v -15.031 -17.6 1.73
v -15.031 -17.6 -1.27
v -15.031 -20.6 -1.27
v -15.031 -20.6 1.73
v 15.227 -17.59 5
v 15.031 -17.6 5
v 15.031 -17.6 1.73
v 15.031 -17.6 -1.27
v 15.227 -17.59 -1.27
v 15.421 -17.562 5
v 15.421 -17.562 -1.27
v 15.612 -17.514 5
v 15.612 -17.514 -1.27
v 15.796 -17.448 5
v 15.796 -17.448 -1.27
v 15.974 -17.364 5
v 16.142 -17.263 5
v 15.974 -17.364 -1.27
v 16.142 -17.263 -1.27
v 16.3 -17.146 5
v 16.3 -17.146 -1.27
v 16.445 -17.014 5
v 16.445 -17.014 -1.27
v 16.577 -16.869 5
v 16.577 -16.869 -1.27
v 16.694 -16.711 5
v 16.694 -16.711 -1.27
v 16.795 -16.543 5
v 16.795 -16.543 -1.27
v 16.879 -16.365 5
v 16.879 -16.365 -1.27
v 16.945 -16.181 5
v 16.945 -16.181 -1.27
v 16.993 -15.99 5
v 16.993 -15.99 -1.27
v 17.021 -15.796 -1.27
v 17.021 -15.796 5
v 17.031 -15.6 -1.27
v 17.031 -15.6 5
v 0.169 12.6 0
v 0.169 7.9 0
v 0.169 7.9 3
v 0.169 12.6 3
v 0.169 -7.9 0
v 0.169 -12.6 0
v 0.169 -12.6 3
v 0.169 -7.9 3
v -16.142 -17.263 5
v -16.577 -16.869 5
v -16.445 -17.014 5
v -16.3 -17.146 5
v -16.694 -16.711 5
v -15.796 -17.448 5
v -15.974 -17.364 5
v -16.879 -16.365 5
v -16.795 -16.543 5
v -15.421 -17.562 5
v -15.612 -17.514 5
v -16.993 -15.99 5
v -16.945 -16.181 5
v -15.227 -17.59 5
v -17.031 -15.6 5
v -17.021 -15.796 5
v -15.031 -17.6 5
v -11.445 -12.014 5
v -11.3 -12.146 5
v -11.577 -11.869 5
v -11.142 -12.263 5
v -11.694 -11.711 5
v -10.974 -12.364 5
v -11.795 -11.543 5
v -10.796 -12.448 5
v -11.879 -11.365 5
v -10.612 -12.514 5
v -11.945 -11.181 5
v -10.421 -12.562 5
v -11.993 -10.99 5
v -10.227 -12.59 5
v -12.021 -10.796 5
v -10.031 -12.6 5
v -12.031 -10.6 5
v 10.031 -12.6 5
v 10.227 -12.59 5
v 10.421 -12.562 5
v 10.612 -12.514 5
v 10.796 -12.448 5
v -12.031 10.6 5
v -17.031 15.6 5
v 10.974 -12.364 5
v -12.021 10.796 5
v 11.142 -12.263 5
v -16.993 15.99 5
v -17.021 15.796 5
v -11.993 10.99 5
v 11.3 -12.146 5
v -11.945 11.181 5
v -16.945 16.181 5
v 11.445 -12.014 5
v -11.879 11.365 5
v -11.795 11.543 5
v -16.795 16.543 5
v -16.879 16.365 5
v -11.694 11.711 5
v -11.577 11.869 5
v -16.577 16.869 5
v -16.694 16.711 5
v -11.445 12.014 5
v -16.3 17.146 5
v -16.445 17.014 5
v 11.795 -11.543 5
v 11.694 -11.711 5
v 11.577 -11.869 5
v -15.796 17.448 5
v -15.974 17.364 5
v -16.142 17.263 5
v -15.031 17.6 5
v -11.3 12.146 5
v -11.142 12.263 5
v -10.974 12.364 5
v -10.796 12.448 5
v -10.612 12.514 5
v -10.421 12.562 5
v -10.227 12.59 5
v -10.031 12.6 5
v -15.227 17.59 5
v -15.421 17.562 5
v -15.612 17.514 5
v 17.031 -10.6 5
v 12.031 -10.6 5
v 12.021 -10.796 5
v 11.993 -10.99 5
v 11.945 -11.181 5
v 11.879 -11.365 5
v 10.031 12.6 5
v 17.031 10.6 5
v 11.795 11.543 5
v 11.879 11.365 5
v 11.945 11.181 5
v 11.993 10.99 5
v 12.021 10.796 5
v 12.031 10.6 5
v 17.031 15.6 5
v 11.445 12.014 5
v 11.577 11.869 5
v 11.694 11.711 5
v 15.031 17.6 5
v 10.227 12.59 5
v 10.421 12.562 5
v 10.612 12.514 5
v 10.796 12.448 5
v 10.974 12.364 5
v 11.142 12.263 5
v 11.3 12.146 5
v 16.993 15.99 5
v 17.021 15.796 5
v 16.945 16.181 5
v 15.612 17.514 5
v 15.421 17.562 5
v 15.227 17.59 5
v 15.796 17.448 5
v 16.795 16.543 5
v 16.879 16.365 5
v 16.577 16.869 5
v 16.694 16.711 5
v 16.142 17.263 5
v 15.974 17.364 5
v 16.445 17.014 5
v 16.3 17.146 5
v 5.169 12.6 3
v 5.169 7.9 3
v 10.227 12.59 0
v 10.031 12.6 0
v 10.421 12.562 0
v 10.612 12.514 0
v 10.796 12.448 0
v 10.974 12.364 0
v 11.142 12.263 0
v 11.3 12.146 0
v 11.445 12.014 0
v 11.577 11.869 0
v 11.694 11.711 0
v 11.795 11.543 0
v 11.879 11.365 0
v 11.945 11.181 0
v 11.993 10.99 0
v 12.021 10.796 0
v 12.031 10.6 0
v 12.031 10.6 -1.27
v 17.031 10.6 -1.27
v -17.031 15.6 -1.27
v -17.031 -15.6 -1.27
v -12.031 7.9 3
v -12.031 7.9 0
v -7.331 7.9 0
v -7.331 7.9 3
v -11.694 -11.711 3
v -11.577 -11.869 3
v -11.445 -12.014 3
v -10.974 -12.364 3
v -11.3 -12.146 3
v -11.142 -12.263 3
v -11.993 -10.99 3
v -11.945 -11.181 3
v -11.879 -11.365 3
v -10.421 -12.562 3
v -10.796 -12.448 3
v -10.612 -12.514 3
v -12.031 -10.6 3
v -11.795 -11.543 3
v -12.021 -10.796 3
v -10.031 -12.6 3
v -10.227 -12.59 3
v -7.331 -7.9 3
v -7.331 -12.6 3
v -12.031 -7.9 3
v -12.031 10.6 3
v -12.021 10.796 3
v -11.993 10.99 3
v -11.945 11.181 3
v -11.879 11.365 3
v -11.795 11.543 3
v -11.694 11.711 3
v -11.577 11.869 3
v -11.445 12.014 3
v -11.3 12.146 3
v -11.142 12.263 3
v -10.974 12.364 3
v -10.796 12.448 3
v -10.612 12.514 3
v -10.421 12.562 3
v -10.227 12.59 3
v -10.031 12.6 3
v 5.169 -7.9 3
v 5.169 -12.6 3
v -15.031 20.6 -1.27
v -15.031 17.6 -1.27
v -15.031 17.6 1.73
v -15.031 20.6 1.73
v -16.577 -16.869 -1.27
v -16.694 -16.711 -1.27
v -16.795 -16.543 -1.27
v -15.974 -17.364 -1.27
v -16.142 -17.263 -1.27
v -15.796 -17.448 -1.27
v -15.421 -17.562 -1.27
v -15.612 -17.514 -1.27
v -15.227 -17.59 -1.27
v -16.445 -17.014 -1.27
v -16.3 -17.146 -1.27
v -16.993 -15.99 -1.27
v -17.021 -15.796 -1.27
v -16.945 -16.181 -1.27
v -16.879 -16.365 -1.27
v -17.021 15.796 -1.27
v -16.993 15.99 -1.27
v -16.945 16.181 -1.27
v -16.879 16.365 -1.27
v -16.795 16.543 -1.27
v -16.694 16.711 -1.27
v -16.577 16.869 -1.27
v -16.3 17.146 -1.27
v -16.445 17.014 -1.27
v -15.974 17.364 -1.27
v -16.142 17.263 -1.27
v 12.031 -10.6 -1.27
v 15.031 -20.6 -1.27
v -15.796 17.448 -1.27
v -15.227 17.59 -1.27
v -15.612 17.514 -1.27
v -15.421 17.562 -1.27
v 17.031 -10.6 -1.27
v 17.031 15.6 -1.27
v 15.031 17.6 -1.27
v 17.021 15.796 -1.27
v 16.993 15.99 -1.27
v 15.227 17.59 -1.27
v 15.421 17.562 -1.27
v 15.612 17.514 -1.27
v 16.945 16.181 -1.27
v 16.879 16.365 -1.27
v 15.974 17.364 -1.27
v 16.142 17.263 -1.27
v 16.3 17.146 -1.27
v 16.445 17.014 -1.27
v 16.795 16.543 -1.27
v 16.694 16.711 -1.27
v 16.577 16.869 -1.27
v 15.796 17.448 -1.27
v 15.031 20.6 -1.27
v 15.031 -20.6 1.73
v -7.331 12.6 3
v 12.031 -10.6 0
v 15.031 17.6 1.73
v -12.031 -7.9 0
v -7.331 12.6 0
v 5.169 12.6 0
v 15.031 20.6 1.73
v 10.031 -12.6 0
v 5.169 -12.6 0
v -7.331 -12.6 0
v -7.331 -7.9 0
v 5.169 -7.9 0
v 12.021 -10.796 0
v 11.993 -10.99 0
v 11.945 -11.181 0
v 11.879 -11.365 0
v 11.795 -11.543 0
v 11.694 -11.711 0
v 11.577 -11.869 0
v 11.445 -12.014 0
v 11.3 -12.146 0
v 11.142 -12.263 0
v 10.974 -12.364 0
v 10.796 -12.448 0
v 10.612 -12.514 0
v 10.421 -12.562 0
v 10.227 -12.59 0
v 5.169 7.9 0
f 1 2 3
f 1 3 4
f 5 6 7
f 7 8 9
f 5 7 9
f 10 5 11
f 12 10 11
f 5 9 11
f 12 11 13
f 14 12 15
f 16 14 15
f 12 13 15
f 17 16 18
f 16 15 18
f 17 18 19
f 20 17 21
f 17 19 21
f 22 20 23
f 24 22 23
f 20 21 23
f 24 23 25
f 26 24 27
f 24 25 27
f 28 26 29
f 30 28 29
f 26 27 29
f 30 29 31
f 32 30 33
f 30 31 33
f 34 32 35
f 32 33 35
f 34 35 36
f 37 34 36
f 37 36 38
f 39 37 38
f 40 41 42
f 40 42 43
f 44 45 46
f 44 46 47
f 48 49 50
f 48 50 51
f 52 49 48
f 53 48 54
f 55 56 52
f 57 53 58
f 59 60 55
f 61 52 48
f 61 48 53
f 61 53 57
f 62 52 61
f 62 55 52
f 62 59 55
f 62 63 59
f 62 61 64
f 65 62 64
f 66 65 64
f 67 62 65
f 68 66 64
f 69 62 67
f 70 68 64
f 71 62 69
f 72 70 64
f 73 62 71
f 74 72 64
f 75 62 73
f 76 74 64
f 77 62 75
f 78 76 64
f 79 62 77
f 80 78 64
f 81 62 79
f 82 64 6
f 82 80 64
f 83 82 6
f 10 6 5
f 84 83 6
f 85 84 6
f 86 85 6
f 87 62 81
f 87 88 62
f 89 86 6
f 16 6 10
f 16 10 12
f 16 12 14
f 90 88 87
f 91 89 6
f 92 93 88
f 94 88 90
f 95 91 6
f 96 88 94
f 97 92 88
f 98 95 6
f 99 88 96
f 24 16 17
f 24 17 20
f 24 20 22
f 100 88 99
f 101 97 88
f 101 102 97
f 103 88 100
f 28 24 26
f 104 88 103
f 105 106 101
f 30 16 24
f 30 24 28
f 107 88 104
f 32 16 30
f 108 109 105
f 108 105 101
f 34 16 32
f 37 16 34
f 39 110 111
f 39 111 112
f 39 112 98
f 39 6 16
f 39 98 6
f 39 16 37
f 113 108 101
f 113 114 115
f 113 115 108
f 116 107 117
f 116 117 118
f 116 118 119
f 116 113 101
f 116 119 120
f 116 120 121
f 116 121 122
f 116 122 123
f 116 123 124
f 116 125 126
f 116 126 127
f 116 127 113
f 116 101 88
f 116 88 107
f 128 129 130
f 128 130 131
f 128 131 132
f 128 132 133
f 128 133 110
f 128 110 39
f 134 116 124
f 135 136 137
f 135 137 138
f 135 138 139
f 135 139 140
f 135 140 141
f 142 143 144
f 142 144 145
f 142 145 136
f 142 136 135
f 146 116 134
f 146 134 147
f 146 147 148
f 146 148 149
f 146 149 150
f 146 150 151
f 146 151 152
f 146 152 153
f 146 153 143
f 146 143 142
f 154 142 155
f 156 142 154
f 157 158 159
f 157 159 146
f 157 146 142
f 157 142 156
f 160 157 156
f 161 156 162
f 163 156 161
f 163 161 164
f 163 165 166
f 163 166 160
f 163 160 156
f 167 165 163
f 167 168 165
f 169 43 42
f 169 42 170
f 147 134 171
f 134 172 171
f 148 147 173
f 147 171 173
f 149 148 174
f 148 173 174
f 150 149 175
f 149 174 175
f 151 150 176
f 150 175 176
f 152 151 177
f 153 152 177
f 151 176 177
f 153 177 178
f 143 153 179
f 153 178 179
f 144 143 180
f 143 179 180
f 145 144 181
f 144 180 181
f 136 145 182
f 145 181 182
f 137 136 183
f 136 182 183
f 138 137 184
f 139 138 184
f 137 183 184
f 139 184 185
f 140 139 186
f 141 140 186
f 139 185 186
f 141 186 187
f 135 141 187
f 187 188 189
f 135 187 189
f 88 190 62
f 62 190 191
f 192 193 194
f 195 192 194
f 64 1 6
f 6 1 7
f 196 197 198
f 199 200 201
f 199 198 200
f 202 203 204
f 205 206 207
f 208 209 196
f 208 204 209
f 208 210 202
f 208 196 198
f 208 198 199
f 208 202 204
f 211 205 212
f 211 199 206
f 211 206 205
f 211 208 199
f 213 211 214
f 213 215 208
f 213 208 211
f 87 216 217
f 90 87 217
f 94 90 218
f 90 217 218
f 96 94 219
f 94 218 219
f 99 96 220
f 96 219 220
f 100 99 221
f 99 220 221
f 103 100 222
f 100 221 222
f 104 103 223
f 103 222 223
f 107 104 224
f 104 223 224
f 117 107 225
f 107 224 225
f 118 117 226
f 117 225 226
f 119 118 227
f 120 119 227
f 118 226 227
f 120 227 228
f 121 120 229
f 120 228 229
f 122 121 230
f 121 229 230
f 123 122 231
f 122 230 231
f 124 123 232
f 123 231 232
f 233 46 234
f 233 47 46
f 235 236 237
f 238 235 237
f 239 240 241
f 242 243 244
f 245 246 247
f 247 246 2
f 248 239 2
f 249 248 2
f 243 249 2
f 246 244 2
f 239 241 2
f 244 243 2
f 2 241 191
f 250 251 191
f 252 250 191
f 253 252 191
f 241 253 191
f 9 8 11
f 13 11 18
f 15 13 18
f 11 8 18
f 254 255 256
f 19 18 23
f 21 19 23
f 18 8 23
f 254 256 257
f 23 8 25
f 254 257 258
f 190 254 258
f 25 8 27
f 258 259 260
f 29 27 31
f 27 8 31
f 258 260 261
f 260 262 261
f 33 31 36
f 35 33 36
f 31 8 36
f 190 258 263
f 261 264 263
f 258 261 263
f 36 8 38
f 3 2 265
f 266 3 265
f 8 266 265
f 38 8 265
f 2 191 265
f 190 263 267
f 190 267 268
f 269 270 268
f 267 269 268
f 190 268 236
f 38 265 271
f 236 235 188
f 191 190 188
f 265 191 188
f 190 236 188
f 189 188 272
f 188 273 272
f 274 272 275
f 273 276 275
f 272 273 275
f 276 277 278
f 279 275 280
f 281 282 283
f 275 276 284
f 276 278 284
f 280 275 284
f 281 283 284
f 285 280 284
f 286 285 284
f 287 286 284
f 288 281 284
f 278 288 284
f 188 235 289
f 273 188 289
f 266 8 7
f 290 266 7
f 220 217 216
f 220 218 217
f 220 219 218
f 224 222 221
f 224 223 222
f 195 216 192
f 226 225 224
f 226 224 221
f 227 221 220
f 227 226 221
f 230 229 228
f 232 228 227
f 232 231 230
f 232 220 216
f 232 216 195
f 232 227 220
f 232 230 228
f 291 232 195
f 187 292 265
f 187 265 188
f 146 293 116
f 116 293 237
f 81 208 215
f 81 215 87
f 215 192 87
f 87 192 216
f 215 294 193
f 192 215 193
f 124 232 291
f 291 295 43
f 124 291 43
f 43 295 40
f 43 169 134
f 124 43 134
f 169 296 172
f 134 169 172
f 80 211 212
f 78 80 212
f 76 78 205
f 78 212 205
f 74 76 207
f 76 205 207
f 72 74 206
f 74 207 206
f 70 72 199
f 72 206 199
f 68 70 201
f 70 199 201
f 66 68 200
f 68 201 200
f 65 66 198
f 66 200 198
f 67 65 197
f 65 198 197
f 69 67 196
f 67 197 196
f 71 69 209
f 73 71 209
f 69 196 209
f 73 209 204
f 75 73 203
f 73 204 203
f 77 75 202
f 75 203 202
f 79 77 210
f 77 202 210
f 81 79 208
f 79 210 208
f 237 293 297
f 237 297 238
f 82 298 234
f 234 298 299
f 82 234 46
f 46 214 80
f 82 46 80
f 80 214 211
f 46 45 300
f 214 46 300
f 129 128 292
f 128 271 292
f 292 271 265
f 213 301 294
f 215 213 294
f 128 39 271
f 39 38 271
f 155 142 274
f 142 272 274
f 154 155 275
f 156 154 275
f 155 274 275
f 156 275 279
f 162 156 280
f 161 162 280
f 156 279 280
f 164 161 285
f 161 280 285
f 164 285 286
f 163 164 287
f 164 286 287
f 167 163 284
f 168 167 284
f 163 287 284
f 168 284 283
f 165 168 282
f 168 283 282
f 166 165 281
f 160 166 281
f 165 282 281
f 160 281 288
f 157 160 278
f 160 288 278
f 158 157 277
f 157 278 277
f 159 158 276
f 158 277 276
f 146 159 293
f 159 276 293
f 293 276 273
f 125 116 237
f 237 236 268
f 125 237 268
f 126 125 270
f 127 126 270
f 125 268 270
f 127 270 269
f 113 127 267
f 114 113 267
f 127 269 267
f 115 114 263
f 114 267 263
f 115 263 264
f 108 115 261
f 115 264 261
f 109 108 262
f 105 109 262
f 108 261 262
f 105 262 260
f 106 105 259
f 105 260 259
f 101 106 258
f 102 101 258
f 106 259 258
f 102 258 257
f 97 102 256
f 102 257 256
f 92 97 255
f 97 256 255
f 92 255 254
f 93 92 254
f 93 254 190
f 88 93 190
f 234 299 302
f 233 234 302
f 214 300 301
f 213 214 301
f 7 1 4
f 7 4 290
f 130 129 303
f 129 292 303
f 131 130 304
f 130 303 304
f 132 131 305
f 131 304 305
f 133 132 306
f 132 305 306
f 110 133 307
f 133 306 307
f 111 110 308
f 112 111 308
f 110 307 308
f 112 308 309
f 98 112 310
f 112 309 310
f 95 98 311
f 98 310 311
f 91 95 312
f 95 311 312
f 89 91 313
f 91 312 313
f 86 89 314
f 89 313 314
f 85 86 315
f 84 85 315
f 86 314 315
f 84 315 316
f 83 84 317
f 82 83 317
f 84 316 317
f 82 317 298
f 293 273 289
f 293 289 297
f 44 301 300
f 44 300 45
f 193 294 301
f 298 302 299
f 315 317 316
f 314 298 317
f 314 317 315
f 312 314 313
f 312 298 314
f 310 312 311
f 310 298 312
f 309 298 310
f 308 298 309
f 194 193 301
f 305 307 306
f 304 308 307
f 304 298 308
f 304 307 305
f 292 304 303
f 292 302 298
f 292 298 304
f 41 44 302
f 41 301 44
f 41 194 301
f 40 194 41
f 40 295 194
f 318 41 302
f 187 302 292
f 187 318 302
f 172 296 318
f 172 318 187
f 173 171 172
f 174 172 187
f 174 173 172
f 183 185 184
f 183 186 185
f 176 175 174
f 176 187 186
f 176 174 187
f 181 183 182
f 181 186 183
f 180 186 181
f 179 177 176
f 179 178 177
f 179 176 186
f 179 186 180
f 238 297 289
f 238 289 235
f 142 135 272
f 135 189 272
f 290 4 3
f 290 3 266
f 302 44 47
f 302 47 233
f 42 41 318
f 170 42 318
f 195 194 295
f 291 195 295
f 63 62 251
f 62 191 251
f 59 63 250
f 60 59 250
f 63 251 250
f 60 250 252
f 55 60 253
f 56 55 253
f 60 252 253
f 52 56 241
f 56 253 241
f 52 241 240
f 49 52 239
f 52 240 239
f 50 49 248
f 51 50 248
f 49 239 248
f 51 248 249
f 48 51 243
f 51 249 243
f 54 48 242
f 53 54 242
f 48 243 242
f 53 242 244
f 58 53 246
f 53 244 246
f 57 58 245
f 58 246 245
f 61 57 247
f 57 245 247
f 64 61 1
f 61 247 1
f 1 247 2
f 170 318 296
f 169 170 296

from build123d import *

# Parameters (mm, degrees)
F0_W     = 5
F0_H     = 4.7
F1_DEPTH = 1.27
F2_DEPTH = 3
F4_DEPTH = 2
F5_W     = 30.062
F5_H     = 3
F6_DEPTH = 3
F7_W     = 30.062
F7_H     = 3
F8_DEPTH = 3


with BuildPart() as f1:
    # F0 (on Top) → F1 (new body)
    with BuildSketch(Plane.XY):
        with BuildLine():
            ThreePointArc((12.031, -10.6), (11.4452135624, -12.0142135624), (10.031, -12.6))
            Line((10.031, -12.6), (5.169, -12.6))
            Line((5.169, -12.6), (0.169, -12.6))
            Line((0.169, -12.6), (-7.331, -12.6))
            Line((-7.331, -12.6), (-10.031, -12.6))
            ThreePointArc((-10.031, -12.6), (-11.4452135624, -12.0142135624), (-12.031, -10.6))
            Line((-12.031, -10.6), (-12.031, -7.9))
            Line((-12.031, -7.9), (-12.031, 7.9))
            Line((-12.031, 7.9), (-12.031, 10.6))
            ThreePointArc((-12.031, 10.6), (-11.4452135624, 12.0142135624), (-10.031, 12.6))
            Line((-10.031, 12.6), (-7.331, 12.6))
            Line((-7.331, 12.6), (0.169, 12.6))
            Line((0.169, 12.6), (5.169, 12.6))
            Line((5.169, 12.6), (10.031, 12.6))
            ThreePointArc((10.031, 12.6), (11.4452135624, 12.0142135624), (12.031, 10.6))
            Line((12.031, 10.6), (17.031, 10.6))
            Line((17.031, 10.6), (17.031, 15.6))
            ThreePointArc((17.031, 15.6), (16.4452135624, 17.0142135624), (15.031, 17.6))
            Line((15.031, 17.6), (-15.031, 17.6))
            ThreePointArc((-15.031, 17.6), (-16.4452135624, 17.0142135624), (-17.031, 15.6))
            Line((-17.031, 15.6), (-17.031, -15.6))
            ThreePointArc((-17.031, -15.6), (-16.4452135624, -17.0142135624), (-15.031, -17.6))
            Line((-15.031, -17.6), (15.031, -17.6))
            ThreePointArc((15.031, -17.6), (16.4452135624, -17.0142135624), (17.031, -15.6))
            Line((17.031, -15.6), (17.031, -10.6))
            Line((17.031, -10.6), (12.031, -10.6))
        make_face()
        with BuildLine():
            Line((5.169, -12.6), (10.031, -12.6))
            ThreePointArc((10.031, -12.6), (11.4452135624, -12.0142135624), (12.031, -10.6))
            Line((12.031, -10.6), (12.031, -10.4))
            Line((12.031, -10.4), (12.031, 10.4))
            Line((12.031, 10.4), (12.031, 10.6))
            ThreePointArc((12.031, 10.6), (11.4452135624, 12.0142135624), (10.031, 12.6))
            Line((10.031, 12.6), (5.169, 12.6))
            Line((5.169, 12.6), (5.169, 7.9))
            Line((5.169, 7.9), (0.169, 7.9))
            Line((0.169, 7.9), (0.169, 12.6))
            Line((0.169, 12.6), (-7.331, 12.6))
            Line((-7.331, 12.6), (-7.331, 7.9))
            Line((-7.331, 7.9), (-12.031, 7.9))
            Line((-12.031, 7.9), (-12.031, -7.9))
            Line((-12.031, -7.9), (-7.331, -7.9))
            Line((-7.331, -7.9), (-7.331, -12.6))
            Line((-7.331, -12.6), (0.169, -12.6))
            Line((0.169, -12.6), (0.169, -7.9))
            Line((0.169, -7.9), (5.169, -7.9))
            Line((5.169, -7.9), (5.169, -12.6))
        make_face()
        with BuildLine():
            Line((-12.031, 10.6), (-12.031, 7.9))
            Line((-12.031, 7.9), (-7.331, 7.9))
            Line((-7.331, 7.9), (-7.331, 12.6))
            Line((-7.331, 12.6), (-10.031, 12.6))
            ThreePointArc((-10.031, 12.6), (-11.4452135624, 12.0142135624), (-12.031, 10.6))
        make_face()
        with Locations((2.669, 10.25)):
            Rectangle(F0_W, F0_H)
        with Locations((2.669, -10.25)):
            Rectangle(F0_W, F0_H)
        with BuildLine():
            Line((-10.031, -12.6), (-7.331, -12.6))
            Line((-7.331, -12.6), (-7.331, -7.9))
            Line((-7.331, -7.9), (-12.031, -7.9))
            Line((-12.031, -7.9), (-12.031, -10.6))
            ThreePointArc((-12.031, -10.6), (-11.4452135624, -12.0142135624), (-10.031, -12.6))
        make_face()
    extrude(amount=-F1_DEPTH)

    # F0 (on Top) → F2 (join)
    with BuildSketch(Plane.XY):
        with BuildLine():
            ThreePointArc((12.031, -10.6), (11.4452135624, -12.0142135624), (10.031, -12.6))
            Line((10.031, -12.6), (5.169, -12.6))
            Line((5.169, -12.6), (0.169, -12.6))
            Line((0.169, -12.6), (-7.331, -12.6))
            Line((-7.331, -12.6), (-10.031, -12.6))
            ThreePointArc((-10.031, -12.6), (-11.4452135624, -12.0142135624), (-12.031, -10.6))
            Line((-12.031, -10.6), (-12.031, -7.9))
            Line((-12.031, -7.9), (-12.031, 7.9))
            Line((-12.031, 7.9), (-12.031, 10.6))
            ThreePointArc((-12.031, 10.6), (-11.4452135624, 12.0142135624), (-10.031, 12.6))
            Line((-10.031, 12.6), (-7.331, 12.6))
            Line((-7.331, 12.6), (0.169, 12.6))
            Line((0.169, 12.6), (5.169, 12.6))
            Line((5.169, 12.6), (10.031, 12.6))
            ThreePointArc((10.031, 12.6), (11.4452135624, 12.0142135624), (12.031, 10.6))
            Line((12.031, 10.6), (17.031, 10.6))
            Line((17.031, 10.6), (17.031, 15.6))
            ThreePointArc((17.031, 15.6), (16.4452135624, 17.0142135624), (15.031, 17.6))
            Line((15.031, 17.6), (-15.031, 17.6))
            ThreePointArc((-15.031, 17.6), (-16.4452135624, 17.0142135624), (-17.031, 15.6))
            Line((-17.031, 15.6), (-17.031, -15.6))
            ThreePointArc((-17.031, -15.6), (-16.4452135624, -17.0142135624), (-15.031, -17.6))
            Line((-15.031, -17.6), (15.031, -17.6))
            ThreePointArc((15.031, -17.6), (16.4452135624, -17.0142135624), (17.031, -15.6))
            Line((17.031, -15.6), (17.031, -10.6))
            Line((17.031, -10.6), (12.031, -10.6))
        make_face()
        with BuildLine():
            Line((-12.031, 10.6), (-12.031, 7.9))
            Line((-12.031, 7.9), (-7.331, 7.9))
            Line((-7.331, 7.9), (-7.331, 12.6))
            Line((-7.331, 12.6), (-10.031, 12.6))
            ThreePointArc((-10.031, 12.6), (-11.4452135624, 12.0142135624), (-12.031, 10.6))
        make_face()
        with Locations((2.669, 10.25)):
            Rectangle(F0_W, F0_H)
        with Locations((2.669, -10.25)):
            Rectangle(F0_W, F0_H)
        with BuildLine():
            Line((-10.031, -12.6), (-7.331, -12.6))
            Line((-7.331, -12.6), (-7.331, -7.9))
            Line((-7.331, -7.9), (-12.031, -7.9))
            Line((-12.031, -7.9), (-12.031, -10.6))
            ThreePointArc((-12.031, -10.6), (-11.4452135624, -12.0142135624), (-10.031, -12.6))
        make_face()
    extrude(amount=F2_DEPTH)

    # F3 (on face) → F4 (join)
    with BuildSketch(Plane.XY.offset(3)):
        with BuildLine():
            ThreePointArc((-12.031, 10.6), (-11.4452135624, 12.0142135624), (-10.031, 12.6))
            Line((-10.031, 12.6), (-7.331, 12.6))
            Line((-7.331, 12.6), (0.169, 12.6))
            Line((0.169, 12.6), (5.169, 12.6))
            Line((5.169, 12.6), (10.031, 12.6))
            ThreePointArc((10.031, 12.6), (11.4452135624, 12.0142135624), (12.031, 10.6))
            Line((12.031, 10.6), (17.031, 10.6))
            Line((17.031, 10.6), (17.031, 15.6))
            ThreePointArc((17.031, 15.6), (16.4452135624, 17.0142135624), (15.031, 17.6))
            Line((15.031, 17.6), (-15.031, 17.6))
            ThreePointArc((-15.031, 17.6), (-16.4452135624, 17.0142135624), (-17.031, 15.6))
            Line((-17.031, 15.6), (-17.031, -15.6))
            ThreePointArc((-17.031, -15.6), (-16.4452135624, -17.0142135624), (-15.031, -17.6))
            Line((-15.031, -17.6), (15.031, -17.6))
            ThreePointArc((15.031, -17.6), (16.4452135624, -17.0142135624), (17.031, -15.6))
            Line((17.031, -15.6), (17.031, -10.6))
            Line((17.031, -10.6), (12.031, -10.6))
            ThreePointArc((12.031, -10.6), (11.4452135624, -12.0142135624), (10.031, -12.6))
            Line((10.031, -12.6), (5.169, -12.6))
            Line((5.169, -12.6), (0.169, -12.6))
            Line((0.169, -12.6), (-7.331, -12.6))
            Line((-7.331, -12.6), (-10.031, -12.6))
            ThreePointArc((-10.031, -12.6), (-11.4452135624, -12.0142135624), (-12.031, -10.6))
            Line((-12.031, -10.6), (-12.031, -7.9))
            Line((-12.031, -7.9), (-12.031, 7.9))
            Line((-12.031, 7.9), (-12.031, 10.6))
        make_face()
    extrude(amount=F4_DEPTH)

    # F5 (on face) → F6 (join)
    with BuildSketch(Plane(origin=(0, 17.6, 0), x_dir=(-1, 0, 0), z_dir=(0, 1, 0))):
        with Locations((0, 0.23)):
            Rectangle(F5_W, F5_H)
    extrude(amount=F6_DEPTH)

    # F7 (on face) → F8 (join)
    with BuildSketch(Plane.XZ.offset(17.6)):
        with Locations((0, 0.23)):
            Rectangle(F7_W, F7_H)
    extrude(amount=F8_DEPTH)


solid = f1.part
